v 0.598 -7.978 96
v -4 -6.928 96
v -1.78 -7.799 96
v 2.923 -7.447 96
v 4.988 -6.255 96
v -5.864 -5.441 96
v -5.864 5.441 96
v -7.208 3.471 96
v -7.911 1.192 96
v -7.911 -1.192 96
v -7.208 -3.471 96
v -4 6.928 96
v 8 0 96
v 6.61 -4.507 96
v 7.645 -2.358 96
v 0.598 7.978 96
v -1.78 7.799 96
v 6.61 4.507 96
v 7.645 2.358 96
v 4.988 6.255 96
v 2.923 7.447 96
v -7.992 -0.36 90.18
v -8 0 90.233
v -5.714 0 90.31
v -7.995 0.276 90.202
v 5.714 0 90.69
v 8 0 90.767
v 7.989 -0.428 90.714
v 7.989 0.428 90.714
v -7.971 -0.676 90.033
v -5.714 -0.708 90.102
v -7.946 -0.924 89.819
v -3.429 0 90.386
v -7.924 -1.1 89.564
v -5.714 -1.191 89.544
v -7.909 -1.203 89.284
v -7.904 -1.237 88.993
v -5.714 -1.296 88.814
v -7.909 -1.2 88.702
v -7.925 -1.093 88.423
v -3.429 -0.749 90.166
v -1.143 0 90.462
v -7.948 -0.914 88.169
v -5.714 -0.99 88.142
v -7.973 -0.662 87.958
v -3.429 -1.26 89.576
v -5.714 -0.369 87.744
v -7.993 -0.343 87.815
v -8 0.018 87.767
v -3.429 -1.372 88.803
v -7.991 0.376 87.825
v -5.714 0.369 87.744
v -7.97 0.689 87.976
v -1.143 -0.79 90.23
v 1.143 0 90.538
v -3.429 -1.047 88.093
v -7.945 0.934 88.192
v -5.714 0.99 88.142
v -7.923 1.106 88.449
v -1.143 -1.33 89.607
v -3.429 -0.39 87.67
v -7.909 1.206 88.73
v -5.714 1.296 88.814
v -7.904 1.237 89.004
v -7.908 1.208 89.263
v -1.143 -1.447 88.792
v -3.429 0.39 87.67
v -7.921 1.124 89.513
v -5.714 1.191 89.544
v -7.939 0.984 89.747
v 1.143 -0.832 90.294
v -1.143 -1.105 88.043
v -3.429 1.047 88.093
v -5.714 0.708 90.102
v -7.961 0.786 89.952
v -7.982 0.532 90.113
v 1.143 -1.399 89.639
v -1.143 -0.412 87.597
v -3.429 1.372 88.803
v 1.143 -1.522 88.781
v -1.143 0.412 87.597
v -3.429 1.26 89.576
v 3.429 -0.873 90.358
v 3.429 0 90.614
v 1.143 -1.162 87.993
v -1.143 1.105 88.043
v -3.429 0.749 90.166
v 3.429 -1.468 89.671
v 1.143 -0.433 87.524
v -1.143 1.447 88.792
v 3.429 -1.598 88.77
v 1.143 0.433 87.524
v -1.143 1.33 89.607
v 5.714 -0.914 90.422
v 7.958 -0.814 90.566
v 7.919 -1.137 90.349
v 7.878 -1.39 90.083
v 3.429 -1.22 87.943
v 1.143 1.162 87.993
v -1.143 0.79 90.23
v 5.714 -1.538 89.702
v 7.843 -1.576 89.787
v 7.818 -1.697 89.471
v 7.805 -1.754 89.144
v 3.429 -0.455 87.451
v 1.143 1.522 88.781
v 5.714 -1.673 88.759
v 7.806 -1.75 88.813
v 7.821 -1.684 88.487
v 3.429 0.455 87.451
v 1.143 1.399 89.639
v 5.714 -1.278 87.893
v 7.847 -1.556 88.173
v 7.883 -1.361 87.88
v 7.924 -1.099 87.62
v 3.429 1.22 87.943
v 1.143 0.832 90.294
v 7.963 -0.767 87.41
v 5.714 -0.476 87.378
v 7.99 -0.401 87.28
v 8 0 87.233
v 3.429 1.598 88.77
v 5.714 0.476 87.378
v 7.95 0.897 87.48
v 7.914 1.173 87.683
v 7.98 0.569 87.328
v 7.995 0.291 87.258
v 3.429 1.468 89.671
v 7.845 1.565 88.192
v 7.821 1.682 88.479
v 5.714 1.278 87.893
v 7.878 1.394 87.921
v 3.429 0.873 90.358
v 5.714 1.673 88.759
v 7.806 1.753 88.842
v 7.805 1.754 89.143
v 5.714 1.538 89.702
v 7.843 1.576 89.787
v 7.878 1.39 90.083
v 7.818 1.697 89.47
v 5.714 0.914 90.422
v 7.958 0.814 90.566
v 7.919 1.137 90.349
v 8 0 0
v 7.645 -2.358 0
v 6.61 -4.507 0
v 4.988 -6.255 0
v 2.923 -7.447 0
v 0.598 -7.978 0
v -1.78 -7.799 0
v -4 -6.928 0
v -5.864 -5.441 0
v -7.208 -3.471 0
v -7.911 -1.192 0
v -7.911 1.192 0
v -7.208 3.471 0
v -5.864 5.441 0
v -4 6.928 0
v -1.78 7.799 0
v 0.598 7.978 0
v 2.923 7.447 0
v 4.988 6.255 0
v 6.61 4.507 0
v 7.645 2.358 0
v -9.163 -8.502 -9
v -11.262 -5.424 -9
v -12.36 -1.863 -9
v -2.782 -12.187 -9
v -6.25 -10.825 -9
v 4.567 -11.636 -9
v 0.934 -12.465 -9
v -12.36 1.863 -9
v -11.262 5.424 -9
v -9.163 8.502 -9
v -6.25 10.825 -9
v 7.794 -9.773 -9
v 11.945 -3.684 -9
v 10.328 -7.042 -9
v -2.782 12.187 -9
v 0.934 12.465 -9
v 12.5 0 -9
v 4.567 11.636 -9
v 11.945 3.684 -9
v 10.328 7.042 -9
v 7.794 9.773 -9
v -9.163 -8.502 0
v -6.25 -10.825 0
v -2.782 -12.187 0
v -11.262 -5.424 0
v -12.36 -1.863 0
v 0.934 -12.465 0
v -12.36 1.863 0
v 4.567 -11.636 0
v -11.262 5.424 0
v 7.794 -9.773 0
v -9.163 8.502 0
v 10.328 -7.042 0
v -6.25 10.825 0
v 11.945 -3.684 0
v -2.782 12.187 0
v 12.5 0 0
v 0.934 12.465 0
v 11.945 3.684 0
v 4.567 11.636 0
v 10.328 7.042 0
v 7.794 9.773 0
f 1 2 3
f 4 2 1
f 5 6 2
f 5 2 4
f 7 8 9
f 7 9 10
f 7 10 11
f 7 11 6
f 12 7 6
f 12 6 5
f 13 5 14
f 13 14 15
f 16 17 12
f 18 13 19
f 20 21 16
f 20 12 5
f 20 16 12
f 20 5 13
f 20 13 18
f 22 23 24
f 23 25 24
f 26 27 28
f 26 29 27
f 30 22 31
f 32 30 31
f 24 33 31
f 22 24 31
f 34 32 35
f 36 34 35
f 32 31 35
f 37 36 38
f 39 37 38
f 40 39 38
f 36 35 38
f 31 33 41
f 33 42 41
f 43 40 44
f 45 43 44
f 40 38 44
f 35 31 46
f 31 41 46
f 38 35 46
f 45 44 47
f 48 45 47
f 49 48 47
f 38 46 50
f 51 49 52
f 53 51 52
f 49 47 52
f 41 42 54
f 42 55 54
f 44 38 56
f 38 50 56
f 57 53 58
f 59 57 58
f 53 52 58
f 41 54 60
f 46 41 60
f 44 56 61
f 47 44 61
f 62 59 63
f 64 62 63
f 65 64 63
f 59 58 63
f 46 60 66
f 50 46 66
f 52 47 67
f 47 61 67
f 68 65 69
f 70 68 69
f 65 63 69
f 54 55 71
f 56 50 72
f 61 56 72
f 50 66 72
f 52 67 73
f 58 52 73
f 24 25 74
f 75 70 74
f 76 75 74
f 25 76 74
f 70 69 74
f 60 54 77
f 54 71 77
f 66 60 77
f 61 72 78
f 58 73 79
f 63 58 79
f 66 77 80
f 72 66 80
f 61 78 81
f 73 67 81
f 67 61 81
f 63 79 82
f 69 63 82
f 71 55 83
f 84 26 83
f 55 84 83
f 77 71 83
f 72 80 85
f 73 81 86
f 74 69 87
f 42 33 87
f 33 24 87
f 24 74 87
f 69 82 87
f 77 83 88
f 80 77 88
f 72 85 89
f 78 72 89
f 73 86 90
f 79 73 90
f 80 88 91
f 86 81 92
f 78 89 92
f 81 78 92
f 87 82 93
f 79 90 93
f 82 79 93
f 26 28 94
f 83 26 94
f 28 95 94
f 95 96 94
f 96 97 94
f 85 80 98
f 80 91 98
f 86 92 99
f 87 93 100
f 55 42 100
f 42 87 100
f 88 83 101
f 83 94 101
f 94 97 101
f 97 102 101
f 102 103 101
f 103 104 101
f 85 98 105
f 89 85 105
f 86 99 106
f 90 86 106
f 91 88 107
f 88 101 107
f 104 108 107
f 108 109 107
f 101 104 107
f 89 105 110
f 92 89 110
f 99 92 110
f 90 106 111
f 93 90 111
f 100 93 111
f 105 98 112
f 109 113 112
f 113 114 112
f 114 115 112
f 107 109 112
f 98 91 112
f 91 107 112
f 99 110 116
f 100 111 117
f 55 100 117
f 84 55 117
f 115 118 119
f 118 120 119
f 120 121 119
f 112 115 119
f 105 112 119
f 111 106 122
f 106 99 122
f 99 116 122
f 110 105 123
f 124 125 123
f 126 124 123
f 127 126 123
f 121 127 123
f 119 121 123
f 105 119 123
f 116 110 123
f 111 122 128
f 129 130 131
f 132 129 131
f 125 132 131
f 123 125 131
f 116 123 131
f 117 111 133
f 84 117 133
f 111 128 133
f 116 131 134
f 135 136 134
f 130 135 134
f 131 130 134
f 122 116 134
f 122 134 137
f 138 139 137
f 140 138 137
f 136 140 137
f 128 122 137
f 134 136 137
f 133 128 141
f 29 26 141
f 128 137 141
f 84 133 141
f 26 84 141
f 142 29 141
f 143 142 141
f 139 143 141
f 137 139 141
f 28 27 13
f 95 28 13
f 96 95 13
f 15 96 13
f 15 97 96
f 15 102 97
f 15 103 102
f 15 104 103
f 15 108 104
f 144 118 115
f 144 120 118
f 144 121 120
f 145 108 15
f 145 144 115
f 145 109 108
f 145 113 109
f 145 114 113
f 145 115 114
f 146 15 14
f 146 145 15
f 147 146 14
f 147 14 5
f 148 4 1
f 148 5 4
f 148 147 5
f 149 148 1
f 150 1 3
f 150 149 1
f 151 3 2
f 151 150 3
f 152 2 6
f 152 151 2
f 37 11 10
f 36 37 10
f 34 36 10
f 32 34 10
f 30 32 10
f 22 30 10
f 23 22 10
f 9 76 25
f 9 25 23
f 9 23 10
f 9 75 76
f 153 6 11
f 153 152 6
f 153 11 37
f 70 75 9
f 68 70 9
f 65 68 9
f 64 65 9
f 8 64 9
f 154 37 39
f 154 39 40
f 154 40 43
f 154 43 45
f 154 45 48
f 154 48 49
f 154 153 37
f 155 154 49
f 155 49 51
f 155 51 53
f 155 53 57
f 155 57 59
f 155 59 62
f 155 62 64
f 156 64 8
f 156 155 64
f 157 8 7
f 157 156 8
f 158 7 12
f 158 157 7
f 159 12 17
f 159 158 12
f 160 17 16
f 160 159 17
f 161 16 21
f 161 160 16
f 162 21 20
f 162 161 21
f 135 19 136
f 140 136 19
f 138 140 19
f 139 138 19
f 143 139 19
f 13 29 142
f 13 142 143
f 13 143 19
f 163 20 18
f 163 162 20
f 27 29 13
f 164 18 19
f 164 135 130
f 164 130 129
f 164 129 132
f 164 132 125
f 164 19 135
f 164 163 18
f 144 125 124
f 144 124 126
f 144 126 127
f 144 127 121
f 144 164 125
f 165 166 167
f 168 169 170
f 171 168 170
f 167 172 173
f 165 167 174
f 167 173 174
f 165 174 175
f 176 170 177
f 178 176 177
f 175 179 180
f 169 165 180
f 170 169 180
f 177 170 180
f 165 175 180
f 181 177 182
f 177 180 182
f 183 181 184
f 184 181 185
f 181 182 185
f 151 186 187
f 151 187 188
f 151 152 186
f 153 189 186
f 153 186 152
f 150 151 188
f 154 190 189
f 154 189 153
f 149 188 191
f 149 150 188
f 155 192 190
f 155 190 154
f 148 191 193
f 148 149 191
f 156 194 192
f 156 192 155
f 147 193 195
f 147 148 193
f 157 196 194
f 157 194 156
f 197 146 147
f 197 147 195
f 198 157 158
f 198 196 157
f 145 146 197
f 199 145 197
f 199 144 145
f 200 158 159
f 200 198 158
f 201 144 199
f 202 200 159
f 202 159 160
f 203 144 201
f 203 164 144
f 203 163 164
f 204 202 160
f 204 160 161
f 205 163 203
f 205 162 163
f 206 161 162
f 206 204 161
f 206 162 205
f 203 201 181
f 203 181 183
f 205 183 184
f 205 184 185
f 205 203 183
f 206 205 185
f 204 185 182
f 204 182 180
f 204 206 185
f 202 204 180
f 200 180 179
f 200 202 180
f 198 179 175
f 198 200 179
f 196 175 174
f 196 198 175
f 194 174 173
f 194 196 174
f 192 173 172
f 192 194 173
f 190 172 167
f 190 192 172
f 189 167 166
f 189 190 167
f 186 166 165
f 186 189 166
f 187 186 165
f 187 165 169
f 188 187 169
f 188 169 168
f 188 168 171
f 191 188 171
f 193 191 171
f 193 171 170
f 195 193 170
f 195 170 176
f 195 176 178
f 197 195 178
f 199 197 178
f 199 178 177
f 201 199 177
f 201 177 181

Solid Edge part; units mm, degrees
sketch "Sketch1" plane through (0, 0, 0) normal (0, 0, 1) x (1, 0, 0)
  circle A0 centre (0, 0) radius 12.5
extrude "ExtrudedProtrusion_1" add sketch "Sketch1" against normal blind 9
sketch "Sketch2" plane through (0, 0, 0) normal (0, 0, 1) x (1, 0, 0)
  circle A0 centre (0, 0) radius 8
extrude "ExtrudedProtrusion_2" add sketch "Sketch2" along normal blind 96
sketch "Sketch3" plane through (0, 0, 0) normal (0, -1, 0) x (1, 0, 0)
  line L0 (15, 89) -> (15, 91)
  line L1 (15, 91) -> (-15, 90)
  line L2 (-15, 90) -> (-15, 89)
  line L3 (15, 89) -> (-15, 89)
  line L4 (0, 89) -> (15, 89)
revolve "RevolvedCutout1" cut sketch "Sketch3" angle 360 about axis through (0, 0, 89) along (1, 0, 0)
